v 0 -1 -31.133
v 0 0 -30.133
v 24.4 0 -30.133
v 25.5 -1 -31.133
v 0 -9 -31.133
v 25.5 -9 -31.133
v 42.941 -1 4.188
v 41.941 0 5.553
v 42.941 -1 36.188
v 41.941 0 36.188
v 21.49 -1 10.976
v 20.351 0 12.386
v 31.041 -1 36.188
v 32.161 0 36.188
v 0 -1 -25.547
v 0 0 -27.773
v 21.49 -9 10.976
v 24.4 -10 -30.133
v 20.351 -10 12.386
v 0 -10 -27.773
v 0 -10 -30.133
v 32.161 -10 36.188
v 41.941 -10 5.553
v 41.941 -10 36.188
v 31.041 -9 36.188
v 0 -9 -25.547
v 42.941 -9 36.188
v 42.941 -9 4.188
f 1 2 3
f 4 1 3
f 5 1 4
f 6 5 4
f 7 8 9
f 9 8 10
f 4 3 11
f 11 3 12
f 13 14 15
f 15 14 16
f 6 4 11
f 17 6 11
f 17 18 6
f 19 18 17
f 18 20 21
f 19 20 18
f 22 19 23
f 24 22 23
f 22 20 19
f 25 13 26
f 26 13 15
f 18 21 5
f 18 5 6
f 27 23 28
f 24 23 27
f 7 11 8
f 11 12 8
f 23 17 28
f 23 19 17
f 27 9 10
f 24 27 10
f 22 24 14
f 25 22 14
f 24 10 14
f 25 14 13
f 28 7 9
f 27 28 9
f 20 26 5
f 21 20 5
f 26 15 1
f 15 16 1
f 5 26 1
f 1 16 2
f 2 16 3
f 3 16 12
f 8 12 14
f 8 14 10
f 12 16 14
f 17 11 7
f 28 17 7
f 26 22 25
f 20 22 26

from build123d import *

# Parameters (mm, degrees)
F1_DEPTH = 10
F4_SIZE  = 1


# Not quite as in the source:
# - a feature of the source that left no trace in its solid (it failed there, or was rolled back) is left out


with BuildPart() as f1:
    # F0 (on Front) → F1 (new body)
    with BuildSketch(Plane.XZ):
        Polygon((0, -25.5473433032), (0, -31.1332004264), (25.5, -31.1332004264), (21.4898194077, 10.9762813041), (42.9413538213, 4.1879331029), (42.9413538213, 36.1879331029), (31.0413538213, 36.1879331029), align=None)
    extrude(amount=F1_DEPTH)

    # F4
    f4_edges = [f1.edges().sort_by_distance(p)[0] for p in [
        (23.49491, 0, -10.07846),
        (32.215587, 0, 7.582107),
        (42.941354, 0, 20.187933),
        (15.520677, 0, 5.320295),
        (23.49491, -10, -10.07846),
        (32.215587, -10, 7.582107),
        (42.941354, -10, 20.187933),
        (15.520677, -10, 5.320295),
        (12.75, 0, -31.1332),
        (12.75, -10, -31.1332),
    ]]
    chamfer(f4_edges, length=F4_SIZE)


solid = f1.part
